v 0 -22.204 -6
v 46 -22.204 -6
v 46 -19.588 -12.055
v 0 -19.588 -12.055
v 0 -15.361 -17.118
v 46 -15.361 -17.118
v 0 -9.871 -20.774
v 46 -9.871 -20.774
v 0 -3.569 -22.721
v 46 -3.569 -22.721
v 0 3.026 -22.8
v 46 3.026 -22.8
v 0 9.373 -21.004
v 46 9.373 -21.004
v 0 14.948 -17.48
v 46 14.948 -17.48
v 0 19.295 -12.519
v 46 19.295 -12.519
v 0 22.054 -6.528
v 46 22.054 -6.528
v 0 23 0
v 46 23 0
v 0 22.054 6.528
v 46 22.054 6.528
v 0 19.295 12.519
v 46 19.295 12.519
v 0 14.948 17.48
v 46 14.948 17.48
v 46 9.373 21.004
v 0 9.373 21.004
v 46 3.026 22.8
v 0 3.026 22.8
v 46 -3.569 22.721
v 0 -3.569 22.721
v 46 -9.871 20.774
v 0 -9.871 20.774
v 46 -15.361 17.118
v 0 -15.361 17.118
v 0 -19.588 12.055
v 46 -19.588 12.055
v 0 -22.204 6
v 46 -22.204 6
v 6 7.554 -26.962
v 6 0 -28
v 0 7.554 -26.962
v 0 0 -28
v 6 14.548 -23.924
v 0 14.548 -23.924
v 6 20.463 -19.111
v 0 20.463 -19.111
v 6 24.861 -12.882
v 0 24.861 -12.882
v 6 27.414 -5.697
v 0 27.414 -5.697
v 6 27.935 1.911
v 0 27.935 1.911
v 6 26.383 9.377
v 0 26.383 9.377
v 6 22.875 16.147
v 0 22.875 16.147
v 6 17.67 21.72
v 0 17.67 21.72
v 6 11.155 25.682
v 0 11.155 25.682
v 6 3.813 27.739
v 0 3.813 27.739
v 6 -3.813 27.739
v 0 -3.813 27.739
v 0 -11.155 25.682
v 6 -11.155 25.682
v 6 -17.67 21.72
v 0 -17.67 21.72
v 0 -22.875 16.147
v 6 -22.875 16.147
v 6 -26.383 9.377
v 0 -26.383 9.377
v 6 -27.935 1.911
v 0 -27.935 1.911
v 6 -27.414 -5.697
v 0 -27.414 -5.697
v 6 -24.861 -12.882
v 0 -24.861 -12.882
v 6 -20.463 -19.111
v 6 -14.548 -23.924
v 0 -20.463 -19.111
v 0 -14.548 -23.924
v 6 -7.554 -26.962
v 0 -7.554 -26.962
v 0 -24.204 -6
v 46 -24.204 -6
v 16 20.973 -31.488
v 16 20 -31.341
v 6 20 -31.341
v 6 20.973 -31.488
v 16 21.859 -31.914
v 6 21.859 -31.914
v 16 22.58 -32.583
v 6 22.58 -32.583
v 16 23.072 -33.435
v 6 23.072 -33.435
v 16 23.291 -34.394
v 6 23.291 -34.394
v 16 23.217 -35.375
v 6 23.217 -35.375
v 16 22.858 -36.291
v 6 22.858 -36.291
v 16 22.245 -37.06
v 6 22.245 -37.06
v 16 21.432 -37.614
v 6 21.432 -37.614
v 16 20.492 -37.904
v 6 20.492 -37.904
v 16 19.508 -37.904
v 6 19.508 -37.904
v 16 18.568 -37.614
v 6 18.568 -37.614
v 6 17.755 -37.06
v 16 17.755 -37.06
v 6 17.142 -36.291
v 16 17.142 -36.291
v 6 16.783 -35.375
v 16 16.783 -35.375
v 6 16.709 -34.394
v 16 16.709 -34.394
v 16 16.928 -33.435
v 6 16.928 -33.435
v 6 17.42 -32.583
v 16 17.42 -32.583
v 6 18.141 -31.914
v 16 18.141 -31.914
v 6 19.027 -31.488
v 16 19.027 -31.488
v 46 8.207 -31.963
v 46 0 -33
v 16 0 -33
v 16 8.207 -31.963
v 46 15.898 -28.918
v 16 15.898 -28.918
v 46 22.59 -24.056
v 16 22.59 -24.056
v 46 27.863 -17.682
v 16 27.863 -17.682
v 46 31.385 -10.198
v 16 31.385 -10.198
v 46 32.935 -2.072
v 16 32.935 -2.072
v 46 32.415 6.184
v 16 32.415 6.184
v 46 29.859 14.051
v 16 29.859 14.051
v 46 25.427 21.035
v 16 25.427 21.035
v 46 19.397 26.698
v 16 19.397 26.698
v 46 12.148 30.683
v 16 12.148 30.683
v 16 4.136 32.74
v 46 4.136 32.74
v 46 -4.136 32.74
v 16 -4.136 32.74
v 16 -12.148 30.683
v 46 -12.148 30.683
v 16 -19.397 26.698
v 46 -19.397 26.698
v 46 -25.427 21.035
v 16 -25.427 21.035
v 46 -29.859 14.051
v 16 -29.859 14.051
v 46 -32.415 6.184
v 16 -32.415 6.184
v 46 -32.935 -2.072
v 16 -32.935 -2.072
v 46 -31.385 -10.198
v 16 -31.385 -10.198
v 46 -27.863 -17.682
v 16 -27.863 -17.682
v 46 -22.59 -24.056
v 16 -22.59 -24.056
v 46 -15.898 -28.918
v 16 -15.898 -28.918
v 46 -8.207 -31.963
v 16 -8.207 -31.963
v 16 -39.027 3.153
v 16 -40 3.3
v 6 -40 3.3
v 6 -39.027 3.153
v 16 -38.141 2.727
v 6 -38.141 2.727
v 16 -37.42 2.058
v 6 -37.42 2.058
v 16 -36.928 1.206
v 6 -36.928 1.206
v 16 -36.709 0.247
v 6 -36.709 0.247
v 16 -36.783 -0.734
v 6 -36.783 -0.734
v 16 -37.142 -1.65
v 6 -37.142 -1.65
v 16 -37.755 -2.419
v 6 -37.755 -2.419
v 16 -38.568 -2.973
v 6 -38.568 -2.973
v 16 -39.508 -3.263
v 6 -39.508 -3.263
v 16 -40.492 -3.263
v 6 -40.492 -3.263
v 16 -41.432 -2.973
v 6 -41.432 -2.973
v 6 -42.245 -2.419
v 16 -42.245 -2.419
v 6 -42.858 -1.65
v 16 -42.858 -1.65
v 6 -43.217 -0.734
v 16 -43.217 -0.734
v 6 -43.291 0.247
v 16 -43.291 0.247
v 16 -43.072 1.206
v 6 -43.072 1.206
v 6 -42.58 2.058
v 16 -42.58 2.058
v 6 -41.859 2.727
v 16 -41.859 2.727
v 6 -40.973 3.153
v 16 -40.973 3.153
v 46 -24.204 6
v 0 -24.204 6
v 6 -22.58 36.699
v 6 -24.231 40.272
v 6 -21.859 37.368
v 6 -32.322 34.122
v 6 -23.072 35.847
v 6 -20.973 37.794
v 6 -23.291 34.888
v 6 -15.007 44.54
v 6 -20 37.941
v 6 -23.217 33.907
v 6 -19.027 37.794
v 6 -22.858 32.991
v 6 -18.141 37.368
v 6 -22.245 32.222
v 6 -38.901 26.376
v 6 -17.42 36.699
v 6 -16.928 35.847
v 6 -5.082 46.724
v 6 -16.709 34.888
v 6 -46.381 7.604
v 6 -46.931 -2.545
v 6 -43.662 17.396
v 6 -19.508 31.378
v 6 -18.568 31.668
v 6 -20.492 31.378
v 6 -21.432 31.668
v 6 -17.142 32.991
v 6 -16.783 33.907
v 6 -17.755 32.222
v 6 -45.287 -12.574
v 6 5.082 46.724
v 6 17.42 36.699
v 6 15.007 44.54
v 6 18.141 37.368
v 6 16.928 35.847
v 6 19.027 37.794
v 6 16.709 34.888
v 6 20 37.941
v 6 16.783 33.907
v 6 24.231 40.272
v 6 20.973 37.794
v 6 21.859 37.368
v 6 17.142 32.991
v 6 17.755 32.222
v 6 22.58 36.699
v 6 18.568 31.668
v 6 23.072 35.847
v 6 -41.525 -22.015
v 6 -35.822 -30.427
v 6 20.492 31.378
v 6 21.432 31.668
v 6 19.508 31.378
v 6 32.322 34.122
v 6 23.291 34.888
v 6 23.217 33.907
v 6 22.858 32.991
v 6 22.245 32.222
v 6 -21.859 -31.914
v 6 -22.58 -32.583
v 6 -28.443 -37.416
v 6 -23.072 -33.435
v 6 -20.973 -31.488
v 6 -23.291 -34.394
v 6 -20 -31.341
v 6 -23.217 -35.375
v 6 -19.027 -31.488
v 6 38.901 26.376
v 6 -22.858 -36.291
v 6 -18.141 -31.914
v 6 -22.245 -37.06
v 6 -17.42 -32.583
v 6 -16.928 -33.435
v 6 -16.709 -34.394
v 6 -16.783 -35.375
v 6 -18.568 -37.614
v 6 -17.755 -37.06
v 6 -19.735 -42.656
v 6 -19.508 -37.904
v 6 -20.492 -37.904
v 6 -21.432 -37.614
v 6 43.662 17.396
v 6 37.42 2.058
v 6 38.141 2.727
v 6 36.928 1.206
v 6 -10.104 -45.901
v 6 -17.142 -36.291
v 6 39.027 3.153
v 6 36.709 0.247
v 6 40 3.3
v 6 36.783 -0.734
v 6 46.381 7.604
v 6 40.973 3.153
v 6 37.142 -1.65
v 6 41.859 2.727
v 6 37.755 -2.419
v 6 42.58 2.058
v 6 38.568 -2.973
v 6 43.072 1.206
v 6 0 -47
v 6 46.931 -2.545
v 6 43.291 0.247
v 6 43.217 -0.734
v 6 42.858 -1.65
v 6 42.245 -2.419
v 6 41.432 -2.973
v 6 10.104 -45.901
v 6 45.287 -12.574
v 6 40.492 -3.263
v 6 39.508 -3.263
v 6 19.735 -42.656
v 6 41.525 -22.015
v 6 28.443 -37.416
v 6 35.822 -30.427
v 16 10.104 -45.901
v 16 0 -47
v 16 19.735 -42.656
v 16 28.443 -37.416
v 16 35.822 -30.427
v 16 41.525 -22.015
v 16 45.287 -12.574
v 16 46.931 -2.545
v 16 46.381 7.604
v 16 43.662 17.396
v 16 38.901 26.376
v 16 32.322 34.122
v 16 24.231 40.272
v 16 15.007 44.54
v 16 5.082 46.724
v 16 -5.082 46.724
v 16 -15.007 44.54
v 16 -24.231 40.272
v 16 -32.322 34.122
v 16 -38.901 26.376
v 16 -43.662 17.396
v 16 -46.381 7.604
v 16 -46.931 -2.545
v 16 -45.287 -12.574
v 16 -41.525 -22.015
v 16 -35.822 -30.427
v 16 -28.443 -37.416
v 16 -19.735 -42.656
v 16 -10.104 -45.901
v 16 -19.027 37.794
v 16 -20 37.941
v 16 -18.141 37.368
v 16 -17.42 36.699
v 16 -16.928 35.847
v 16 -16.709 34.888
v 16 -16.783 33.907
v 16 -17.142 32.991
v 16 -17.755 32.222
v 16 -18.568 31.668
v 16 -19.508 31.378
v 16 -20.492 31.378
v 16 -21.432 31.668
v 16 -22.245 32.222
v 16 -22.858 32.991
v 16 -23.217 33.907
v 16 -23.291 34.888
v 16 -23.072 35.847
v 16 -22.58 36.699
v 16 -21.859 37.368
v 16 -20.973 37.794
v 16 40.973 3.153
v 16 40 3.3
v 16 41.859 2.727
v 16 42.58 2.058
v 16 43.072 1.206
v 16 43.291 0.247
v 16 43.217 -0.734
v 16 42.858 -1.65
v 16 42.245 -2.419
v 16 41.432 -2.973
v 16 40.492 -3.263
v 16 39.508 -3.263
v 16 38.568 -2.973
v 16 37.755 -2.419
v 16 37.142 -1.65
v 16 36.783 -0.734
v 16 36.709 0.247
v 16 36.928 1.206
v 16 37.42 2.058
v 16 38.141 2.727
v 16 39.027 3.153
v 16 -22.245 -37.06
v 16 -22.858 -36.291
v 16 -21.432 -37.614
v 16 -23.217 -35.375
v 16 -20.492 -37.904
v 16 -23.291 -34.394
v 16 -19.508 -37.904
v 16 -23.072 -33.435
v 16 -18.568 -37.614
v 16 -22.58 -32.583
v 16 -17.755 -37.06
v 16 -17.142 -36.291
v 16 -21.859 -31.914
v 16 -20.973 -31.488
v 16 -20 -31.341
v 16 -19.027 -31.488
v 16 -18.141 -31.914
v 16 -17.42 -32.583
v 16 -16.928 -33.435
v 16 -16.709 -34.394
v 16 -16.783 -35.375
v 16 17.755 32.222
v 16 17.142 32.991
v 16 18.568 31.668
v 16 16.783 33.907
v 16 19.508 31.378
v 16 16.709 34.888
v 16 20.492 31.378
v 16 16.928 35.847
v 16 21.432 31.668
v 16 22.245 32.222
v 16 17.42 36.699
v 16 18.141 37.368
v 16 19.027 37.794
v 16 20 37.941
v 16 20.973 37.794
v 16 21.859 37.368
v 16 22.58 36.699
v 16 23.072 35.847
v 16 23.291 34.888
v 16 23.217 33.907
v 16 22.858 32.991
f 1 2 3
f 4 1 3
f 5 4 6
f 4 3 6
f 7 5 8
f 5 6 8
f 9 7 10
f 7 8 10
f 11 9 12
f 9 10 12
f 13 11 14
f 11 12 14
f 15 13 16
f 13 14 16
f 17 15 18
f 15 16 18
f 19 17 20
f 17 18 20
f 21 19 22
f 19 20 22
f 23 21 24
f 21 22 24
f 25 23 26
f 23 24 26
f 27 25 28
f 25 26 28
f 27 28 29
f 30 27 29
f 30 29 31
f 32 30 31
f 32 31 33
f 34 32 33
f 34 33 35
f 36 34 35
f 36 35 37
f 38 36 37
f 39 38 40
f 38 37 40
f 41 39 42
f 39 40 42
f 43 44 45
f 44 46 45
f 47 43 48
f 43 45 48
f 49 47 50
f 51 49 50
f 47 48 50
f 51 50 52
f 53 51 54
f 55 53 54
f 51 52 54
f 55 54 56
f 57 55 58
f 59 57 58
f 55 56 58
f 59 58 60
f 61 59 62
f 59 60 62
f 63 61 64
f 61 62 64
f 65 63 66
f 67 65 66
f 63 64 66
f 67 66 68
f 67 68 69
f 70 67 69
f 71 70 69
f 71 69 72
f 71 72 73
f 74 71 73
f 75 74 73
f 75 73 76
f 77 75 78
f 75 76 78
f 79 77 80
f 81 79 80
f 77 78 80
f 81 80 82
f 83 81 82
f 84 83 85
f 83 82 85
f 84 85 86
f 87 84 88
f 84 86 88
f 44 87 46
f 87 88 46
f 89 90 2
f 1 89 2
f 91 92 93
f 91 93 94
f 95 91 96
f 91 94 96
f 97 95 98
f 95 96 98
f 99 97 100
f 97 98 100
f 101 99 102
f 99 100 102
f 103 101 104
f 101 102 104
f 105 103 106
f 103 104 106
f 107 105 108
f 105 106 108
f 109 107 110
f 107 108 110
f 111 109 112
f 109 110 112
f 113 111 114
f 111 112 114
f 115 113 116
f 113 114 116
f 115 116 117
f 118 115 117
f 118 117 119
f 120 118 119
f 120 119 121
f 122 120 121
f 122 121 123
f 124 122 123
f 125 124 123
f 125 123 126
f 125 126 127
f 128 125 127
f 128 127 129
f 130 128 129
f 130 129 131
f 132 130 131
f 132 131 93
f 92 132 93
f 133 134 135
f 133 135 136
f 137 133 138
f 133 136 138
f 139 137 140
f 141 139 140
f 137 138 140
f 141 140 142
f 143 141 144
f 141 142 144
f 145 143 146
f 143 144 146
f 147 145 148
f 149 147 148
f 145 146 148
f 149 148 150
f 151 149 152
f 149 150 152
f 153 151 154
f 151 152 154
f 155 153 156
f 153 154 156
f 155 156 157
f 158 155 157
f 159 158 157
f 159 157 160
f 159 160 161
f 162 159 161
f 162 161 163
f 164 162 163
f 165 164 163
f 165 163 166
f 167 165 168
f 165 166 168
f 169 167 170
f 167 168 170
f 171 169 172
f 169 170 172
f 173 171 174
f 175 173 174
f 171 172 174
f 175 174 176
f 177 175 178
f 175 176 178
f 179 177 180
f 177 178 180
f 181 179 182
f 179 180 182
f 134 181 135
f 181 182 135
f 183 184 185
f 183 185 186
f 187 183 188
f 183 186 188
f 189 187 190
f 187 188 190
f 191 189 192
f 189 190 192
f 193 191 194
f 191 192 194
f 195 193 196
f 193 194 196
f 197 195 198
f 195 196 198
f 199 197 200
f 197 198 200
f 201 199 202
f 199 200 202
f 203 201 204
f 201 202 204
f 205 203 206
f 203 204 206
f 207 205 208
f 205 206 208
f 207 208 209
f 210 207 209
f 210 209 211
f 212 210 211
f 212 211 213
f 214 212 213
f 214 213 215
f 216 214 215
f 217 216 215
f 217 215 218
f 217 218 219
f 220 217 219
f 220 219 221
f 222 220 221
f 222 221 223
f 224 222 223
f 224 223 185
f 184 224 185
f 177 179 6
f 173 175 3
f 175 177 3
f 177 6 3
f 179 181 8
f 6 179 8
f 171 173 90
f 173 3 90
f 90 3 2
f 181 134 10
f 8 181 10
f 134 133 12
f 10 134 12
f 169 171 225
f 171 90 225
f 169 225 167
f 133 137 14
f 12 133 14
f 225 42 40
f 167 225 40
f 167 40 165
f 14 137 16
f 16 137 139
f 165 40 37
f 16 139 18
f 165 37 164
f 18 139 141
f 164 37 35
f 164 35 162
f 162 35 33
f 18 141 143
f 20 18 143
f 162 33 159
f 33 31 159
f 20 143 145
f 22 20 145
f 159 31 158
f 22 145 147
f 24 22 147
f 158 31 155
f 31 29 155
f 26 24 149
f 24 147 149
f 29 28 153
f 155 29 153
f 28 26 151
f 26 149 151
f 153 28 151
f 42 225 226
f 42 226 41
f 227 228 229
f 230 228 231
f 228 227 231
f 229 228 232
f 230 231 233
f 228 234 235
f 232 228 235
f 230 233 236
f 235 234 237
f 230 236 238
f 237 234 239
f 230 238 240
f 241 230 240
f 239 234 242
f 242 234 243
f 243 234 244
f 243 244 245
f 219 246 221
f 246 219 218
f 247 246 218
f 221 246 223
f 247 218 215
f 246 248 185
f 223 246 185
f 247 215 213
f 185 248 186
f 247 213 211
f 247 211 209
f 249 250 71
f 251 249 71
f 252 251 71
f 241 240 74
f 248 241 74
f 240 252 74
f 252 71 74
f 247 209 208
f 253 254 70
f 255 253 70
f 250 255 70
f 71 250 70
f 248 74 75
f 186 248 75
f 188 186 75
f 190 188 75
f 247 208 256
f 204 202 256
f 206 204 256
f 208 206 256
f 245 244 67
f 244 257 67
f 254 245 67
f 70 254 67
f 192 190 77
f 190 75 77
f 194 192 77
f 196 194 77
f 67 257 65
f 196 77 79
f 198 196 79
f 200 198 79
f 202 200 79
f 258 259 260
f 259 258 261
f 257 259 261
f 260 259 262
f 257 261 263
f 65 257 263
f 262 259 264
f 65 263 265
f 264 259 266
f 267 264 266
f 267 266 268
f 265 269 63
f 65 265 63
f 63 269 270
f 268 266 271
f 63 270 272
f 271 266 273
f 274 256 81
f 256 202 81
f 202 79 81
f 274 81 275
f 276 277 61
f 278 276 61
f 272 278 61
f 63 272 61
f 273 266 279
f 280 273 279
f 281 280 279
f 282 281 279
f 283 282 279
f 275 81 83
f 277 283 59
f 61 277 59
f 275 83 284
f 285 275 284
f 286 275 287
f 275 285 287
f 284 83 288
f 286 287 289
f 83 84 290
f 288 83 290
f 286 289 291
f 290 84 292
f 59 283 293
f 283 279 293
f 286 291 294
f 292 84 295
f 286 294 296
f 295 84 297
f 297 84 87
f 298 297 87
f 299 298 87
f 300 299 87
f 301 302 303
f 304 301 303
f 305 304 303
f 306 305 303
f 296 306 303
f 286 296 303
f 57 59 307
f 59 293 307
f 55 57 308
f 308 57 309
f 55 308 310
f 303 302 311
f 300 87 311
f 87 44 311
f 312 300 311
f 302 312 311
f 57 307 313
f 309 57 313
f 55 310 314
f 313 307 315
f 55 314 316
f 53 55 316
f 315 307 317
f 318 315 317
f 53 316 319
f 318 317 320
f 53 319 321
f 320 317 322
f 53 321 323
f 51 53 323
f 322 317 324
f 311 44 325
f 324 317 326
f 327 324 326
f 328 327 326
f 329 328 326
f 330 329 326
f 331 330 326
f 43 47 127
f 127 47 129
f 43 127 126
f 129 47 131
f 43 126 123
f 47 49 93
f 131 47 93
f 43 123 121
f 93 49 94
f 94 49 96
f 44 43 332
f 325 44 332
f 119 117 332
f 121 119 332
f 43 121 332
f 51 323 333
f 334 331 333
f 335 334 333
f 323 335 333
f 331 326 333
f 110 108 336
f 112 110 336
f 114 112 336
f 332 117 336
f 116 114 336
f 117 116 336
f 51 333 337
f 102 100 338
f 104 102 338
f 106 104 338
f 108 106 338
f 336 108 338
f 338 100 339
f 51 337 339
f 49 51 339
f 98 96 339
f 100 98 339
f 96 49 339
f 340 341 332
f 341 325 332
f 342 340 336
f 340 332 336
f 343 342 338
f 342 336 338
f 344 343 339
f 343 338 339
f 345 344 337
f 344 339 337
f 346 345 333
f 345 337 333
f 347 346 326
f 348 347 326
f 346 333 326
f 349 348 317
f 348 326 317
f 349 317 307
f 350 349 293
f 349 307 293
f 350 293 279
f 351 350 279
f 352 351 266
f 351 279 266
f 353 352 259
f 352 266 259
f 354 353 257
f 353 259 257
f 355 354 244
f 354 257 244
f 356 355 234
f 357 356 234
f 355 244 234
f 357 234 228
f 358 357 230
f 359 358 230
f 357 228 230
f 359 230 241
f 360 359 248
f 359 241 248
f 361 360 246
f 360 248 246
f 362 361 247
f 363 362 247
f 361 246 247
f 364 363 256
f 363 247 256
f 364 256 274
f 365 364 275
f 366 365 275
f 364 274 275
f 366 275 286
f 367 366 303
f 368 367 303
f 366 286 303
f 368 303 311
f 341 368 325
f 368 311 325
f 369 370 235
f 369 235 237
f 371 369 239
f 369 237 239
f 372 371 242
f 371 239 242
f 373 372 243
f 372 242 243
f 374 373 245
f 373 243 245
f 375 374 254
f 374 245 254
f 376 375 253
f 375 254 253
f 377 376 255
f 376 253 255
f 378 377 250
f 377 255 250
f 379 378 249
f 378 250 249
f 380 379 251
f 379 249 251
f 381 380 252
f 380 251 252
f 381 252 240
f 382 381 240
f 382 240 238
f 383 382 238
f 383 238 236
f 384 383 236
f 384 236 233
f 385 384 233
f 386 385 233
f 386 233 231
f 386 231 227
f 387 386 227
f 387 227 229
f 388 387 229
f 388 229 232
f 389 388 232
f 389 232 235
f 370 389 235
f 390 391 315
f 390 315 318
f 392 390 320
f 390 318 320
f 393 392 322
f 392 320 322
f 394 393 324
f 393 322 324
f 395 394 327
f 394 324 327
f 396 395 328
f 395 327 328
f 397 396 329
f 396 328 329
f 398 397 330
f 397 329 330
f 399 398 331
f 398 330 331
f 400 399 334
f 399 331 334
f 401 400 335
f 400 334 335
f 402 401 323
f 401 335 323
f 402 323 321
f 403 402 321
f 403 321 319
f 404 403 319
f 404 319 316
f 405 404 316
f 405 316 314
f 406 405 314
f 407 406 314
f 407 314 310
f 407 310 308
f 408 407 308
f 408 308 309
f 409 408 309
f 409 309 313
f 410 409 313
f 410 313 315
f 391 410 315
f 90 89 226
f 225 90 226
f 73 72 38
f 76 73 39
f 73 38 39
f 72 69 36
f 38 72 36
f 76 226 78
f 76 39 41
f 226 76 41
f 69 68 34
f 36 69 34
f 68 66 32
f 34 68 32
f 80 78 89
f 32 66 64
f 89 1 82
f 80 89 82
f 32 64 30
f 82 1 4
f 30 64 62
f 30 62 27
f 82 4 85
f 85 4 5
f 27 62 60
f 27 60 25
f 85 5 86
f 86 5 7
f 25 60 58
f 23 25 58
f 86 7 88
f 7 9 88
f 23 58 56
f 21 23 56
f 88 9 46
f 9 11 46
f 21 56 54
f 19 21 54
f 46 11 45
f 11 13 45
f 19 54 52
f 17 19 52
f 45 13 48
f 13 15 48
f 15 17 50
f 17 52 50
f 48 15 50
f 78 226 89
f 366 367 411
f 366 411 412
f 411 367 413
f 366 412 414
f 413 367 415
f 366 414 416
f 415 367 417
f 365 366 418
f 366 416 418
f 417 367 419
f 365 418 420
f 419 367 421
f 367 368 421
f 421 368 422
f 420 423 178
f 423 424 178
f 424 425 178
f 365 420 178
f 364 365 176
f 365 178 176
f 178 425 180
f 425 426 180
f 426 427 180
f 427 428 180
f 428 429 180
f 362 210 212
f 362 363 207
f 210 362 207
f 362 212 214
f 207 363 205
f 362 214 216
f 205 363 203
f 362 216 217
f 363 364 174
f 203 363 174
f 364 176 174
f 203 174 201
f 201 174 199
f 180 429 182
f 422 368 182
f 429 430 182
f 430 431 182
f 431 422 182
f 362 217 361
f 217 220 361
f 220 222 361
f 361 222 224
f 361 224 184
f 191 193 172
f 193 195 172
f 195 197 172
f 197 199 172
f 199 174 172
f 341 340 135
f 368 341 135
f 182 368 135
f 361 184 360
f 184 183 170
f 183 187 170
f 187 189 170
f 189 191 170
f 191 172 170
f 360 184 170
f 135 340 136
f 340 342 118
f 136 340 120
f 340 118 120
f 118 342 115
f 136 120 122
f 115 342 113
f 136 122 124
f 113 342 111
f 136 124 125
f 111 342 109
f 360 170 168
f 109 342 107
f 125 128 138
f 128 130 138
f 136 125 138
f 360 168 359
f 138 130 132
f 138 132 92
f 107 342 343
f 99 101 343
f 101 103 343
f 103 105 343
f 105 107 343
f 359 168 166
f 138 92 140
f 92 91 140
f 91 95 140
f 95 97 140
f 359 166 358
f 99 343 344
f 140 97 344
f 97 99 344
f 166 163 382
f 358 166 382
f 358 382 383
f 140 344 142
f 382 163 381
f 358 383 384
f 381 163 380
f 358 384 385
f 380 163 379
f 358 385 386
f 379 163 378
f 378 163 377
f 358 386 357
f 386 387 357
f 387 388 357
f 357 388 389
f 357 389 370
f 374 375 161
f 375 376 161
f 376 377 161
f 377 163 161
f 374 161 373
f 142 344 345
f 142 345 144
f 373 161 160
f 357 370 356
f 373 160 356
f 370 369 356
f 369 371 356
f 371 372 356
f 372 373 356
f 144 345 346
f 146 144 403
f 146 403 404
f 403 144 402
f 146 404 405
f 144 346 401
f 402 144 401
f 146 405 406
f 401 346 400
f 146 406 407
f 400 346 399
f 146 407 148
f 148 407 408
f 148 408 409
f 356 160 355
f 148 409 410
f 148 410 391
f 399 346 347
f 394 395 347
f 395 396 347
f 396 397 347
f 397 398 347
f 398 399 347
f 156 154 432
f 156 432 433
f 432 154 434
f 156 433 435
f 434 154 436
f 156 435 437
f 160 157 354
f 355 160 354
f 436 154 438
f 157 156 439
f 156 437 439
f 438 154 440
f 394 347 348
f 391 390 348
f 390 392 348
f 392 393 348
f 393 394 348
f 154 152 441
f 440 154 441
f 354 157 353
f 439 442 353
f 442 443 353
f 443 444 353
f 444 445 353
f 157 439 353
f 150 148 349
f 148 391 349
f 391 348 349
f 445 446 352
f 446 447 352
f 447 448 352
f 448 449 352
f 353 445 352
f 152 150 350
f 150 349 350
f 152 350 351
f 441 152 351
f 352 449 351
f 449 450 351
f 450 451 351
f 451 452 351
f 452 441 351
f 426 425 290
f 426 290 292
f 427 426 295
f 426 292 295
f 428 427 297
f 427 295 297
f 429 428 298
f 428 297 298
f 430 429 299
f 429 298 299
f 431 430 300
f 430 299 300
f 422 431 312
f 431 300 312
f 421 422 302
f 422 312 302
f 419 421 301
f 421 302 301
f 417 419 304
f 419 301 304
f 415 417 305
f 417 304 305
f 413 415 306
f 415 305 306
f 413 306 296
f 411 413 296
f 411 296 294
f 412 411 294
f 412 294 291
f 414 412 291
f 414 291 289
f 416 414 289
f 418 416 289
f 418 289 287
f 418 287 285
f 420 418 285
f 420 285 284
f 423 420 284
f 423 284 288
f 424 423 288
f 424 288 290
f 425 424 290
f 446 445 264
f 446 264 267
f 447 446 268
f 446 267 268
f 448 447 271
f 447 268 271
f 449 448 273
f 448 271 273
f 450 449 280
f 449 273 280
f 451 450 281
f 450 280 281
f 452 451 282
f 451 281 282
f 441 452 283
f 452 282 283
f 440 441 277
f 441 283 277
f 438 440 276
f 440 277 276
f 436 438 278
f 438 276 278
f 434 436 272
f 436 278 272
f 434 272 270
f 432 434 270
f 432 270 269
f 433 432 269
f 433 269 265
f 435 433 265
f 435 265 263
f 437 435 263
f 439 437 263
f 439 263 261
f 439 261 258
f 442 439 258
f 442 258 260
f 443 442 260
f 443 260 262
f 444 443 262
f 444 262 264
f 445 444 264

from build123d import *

# Parameters (mm, degrees)
SKETCH2_R          = 3.3
CUT_EXTRUDE1_DEPTH = 41
SKETCH3_W          = 12
SKETCH3_H          = 2
CUT_EXTRUDE2_DEPTH = 47


with BuildPart() as part:
    # Sketch1 → Revolve1 (revolve)
    with BuildSketch(Plane(origin=(0, 0, 0), x_dir=(1, 0, 0), z_dir=(0, 1, 0))):
        Polygon((0, 23), (46, 23), (46, 33), (16, 33), (16, 47), (6, 47), (6, 28), (0, 28), align=None)
    revolve(axis=Axis((-31.159383033, 0, 0), (1, 0, 0)))

    # Sketch2 → Cut-Extrude1 (cut, through all)
    with BuildSketch(Plane.ZY.offset(-6)):
        with Locations((0, 40)):
            Circle(SKETCH2_R)
        with Locations((34.641016151, 20)):
            Circle(SKETCH2_R)
        with Locations((34.641016151, -20)):
            Circle(SKETCH2_R)
        with Locations((0, -40)):
            Circle(SKETCH2_R)
        with Locations((-34.641016151, -20)):
            Circle(SKETCH2_R)
        with Locations((-34.641016151, 20)):
            Circle(SKETCH2_R)
    extrude(amount=-CUT_EXTRUDE1_DEPTH, mode=Mode.SUBTRACT)

    # Sketch3 → Cut-Extrude2 (cut, through all)
    with BuildSketch(Plane.ZY):
        with Locations((0, -23.203603311)):
            Rectangle(SKETCH3_W, SKETCH3_H)
    extrude(amount=-CUT_EXTRUDE2_DEPTH, mode=Mode.SUBTRACT)


solid = part.part
